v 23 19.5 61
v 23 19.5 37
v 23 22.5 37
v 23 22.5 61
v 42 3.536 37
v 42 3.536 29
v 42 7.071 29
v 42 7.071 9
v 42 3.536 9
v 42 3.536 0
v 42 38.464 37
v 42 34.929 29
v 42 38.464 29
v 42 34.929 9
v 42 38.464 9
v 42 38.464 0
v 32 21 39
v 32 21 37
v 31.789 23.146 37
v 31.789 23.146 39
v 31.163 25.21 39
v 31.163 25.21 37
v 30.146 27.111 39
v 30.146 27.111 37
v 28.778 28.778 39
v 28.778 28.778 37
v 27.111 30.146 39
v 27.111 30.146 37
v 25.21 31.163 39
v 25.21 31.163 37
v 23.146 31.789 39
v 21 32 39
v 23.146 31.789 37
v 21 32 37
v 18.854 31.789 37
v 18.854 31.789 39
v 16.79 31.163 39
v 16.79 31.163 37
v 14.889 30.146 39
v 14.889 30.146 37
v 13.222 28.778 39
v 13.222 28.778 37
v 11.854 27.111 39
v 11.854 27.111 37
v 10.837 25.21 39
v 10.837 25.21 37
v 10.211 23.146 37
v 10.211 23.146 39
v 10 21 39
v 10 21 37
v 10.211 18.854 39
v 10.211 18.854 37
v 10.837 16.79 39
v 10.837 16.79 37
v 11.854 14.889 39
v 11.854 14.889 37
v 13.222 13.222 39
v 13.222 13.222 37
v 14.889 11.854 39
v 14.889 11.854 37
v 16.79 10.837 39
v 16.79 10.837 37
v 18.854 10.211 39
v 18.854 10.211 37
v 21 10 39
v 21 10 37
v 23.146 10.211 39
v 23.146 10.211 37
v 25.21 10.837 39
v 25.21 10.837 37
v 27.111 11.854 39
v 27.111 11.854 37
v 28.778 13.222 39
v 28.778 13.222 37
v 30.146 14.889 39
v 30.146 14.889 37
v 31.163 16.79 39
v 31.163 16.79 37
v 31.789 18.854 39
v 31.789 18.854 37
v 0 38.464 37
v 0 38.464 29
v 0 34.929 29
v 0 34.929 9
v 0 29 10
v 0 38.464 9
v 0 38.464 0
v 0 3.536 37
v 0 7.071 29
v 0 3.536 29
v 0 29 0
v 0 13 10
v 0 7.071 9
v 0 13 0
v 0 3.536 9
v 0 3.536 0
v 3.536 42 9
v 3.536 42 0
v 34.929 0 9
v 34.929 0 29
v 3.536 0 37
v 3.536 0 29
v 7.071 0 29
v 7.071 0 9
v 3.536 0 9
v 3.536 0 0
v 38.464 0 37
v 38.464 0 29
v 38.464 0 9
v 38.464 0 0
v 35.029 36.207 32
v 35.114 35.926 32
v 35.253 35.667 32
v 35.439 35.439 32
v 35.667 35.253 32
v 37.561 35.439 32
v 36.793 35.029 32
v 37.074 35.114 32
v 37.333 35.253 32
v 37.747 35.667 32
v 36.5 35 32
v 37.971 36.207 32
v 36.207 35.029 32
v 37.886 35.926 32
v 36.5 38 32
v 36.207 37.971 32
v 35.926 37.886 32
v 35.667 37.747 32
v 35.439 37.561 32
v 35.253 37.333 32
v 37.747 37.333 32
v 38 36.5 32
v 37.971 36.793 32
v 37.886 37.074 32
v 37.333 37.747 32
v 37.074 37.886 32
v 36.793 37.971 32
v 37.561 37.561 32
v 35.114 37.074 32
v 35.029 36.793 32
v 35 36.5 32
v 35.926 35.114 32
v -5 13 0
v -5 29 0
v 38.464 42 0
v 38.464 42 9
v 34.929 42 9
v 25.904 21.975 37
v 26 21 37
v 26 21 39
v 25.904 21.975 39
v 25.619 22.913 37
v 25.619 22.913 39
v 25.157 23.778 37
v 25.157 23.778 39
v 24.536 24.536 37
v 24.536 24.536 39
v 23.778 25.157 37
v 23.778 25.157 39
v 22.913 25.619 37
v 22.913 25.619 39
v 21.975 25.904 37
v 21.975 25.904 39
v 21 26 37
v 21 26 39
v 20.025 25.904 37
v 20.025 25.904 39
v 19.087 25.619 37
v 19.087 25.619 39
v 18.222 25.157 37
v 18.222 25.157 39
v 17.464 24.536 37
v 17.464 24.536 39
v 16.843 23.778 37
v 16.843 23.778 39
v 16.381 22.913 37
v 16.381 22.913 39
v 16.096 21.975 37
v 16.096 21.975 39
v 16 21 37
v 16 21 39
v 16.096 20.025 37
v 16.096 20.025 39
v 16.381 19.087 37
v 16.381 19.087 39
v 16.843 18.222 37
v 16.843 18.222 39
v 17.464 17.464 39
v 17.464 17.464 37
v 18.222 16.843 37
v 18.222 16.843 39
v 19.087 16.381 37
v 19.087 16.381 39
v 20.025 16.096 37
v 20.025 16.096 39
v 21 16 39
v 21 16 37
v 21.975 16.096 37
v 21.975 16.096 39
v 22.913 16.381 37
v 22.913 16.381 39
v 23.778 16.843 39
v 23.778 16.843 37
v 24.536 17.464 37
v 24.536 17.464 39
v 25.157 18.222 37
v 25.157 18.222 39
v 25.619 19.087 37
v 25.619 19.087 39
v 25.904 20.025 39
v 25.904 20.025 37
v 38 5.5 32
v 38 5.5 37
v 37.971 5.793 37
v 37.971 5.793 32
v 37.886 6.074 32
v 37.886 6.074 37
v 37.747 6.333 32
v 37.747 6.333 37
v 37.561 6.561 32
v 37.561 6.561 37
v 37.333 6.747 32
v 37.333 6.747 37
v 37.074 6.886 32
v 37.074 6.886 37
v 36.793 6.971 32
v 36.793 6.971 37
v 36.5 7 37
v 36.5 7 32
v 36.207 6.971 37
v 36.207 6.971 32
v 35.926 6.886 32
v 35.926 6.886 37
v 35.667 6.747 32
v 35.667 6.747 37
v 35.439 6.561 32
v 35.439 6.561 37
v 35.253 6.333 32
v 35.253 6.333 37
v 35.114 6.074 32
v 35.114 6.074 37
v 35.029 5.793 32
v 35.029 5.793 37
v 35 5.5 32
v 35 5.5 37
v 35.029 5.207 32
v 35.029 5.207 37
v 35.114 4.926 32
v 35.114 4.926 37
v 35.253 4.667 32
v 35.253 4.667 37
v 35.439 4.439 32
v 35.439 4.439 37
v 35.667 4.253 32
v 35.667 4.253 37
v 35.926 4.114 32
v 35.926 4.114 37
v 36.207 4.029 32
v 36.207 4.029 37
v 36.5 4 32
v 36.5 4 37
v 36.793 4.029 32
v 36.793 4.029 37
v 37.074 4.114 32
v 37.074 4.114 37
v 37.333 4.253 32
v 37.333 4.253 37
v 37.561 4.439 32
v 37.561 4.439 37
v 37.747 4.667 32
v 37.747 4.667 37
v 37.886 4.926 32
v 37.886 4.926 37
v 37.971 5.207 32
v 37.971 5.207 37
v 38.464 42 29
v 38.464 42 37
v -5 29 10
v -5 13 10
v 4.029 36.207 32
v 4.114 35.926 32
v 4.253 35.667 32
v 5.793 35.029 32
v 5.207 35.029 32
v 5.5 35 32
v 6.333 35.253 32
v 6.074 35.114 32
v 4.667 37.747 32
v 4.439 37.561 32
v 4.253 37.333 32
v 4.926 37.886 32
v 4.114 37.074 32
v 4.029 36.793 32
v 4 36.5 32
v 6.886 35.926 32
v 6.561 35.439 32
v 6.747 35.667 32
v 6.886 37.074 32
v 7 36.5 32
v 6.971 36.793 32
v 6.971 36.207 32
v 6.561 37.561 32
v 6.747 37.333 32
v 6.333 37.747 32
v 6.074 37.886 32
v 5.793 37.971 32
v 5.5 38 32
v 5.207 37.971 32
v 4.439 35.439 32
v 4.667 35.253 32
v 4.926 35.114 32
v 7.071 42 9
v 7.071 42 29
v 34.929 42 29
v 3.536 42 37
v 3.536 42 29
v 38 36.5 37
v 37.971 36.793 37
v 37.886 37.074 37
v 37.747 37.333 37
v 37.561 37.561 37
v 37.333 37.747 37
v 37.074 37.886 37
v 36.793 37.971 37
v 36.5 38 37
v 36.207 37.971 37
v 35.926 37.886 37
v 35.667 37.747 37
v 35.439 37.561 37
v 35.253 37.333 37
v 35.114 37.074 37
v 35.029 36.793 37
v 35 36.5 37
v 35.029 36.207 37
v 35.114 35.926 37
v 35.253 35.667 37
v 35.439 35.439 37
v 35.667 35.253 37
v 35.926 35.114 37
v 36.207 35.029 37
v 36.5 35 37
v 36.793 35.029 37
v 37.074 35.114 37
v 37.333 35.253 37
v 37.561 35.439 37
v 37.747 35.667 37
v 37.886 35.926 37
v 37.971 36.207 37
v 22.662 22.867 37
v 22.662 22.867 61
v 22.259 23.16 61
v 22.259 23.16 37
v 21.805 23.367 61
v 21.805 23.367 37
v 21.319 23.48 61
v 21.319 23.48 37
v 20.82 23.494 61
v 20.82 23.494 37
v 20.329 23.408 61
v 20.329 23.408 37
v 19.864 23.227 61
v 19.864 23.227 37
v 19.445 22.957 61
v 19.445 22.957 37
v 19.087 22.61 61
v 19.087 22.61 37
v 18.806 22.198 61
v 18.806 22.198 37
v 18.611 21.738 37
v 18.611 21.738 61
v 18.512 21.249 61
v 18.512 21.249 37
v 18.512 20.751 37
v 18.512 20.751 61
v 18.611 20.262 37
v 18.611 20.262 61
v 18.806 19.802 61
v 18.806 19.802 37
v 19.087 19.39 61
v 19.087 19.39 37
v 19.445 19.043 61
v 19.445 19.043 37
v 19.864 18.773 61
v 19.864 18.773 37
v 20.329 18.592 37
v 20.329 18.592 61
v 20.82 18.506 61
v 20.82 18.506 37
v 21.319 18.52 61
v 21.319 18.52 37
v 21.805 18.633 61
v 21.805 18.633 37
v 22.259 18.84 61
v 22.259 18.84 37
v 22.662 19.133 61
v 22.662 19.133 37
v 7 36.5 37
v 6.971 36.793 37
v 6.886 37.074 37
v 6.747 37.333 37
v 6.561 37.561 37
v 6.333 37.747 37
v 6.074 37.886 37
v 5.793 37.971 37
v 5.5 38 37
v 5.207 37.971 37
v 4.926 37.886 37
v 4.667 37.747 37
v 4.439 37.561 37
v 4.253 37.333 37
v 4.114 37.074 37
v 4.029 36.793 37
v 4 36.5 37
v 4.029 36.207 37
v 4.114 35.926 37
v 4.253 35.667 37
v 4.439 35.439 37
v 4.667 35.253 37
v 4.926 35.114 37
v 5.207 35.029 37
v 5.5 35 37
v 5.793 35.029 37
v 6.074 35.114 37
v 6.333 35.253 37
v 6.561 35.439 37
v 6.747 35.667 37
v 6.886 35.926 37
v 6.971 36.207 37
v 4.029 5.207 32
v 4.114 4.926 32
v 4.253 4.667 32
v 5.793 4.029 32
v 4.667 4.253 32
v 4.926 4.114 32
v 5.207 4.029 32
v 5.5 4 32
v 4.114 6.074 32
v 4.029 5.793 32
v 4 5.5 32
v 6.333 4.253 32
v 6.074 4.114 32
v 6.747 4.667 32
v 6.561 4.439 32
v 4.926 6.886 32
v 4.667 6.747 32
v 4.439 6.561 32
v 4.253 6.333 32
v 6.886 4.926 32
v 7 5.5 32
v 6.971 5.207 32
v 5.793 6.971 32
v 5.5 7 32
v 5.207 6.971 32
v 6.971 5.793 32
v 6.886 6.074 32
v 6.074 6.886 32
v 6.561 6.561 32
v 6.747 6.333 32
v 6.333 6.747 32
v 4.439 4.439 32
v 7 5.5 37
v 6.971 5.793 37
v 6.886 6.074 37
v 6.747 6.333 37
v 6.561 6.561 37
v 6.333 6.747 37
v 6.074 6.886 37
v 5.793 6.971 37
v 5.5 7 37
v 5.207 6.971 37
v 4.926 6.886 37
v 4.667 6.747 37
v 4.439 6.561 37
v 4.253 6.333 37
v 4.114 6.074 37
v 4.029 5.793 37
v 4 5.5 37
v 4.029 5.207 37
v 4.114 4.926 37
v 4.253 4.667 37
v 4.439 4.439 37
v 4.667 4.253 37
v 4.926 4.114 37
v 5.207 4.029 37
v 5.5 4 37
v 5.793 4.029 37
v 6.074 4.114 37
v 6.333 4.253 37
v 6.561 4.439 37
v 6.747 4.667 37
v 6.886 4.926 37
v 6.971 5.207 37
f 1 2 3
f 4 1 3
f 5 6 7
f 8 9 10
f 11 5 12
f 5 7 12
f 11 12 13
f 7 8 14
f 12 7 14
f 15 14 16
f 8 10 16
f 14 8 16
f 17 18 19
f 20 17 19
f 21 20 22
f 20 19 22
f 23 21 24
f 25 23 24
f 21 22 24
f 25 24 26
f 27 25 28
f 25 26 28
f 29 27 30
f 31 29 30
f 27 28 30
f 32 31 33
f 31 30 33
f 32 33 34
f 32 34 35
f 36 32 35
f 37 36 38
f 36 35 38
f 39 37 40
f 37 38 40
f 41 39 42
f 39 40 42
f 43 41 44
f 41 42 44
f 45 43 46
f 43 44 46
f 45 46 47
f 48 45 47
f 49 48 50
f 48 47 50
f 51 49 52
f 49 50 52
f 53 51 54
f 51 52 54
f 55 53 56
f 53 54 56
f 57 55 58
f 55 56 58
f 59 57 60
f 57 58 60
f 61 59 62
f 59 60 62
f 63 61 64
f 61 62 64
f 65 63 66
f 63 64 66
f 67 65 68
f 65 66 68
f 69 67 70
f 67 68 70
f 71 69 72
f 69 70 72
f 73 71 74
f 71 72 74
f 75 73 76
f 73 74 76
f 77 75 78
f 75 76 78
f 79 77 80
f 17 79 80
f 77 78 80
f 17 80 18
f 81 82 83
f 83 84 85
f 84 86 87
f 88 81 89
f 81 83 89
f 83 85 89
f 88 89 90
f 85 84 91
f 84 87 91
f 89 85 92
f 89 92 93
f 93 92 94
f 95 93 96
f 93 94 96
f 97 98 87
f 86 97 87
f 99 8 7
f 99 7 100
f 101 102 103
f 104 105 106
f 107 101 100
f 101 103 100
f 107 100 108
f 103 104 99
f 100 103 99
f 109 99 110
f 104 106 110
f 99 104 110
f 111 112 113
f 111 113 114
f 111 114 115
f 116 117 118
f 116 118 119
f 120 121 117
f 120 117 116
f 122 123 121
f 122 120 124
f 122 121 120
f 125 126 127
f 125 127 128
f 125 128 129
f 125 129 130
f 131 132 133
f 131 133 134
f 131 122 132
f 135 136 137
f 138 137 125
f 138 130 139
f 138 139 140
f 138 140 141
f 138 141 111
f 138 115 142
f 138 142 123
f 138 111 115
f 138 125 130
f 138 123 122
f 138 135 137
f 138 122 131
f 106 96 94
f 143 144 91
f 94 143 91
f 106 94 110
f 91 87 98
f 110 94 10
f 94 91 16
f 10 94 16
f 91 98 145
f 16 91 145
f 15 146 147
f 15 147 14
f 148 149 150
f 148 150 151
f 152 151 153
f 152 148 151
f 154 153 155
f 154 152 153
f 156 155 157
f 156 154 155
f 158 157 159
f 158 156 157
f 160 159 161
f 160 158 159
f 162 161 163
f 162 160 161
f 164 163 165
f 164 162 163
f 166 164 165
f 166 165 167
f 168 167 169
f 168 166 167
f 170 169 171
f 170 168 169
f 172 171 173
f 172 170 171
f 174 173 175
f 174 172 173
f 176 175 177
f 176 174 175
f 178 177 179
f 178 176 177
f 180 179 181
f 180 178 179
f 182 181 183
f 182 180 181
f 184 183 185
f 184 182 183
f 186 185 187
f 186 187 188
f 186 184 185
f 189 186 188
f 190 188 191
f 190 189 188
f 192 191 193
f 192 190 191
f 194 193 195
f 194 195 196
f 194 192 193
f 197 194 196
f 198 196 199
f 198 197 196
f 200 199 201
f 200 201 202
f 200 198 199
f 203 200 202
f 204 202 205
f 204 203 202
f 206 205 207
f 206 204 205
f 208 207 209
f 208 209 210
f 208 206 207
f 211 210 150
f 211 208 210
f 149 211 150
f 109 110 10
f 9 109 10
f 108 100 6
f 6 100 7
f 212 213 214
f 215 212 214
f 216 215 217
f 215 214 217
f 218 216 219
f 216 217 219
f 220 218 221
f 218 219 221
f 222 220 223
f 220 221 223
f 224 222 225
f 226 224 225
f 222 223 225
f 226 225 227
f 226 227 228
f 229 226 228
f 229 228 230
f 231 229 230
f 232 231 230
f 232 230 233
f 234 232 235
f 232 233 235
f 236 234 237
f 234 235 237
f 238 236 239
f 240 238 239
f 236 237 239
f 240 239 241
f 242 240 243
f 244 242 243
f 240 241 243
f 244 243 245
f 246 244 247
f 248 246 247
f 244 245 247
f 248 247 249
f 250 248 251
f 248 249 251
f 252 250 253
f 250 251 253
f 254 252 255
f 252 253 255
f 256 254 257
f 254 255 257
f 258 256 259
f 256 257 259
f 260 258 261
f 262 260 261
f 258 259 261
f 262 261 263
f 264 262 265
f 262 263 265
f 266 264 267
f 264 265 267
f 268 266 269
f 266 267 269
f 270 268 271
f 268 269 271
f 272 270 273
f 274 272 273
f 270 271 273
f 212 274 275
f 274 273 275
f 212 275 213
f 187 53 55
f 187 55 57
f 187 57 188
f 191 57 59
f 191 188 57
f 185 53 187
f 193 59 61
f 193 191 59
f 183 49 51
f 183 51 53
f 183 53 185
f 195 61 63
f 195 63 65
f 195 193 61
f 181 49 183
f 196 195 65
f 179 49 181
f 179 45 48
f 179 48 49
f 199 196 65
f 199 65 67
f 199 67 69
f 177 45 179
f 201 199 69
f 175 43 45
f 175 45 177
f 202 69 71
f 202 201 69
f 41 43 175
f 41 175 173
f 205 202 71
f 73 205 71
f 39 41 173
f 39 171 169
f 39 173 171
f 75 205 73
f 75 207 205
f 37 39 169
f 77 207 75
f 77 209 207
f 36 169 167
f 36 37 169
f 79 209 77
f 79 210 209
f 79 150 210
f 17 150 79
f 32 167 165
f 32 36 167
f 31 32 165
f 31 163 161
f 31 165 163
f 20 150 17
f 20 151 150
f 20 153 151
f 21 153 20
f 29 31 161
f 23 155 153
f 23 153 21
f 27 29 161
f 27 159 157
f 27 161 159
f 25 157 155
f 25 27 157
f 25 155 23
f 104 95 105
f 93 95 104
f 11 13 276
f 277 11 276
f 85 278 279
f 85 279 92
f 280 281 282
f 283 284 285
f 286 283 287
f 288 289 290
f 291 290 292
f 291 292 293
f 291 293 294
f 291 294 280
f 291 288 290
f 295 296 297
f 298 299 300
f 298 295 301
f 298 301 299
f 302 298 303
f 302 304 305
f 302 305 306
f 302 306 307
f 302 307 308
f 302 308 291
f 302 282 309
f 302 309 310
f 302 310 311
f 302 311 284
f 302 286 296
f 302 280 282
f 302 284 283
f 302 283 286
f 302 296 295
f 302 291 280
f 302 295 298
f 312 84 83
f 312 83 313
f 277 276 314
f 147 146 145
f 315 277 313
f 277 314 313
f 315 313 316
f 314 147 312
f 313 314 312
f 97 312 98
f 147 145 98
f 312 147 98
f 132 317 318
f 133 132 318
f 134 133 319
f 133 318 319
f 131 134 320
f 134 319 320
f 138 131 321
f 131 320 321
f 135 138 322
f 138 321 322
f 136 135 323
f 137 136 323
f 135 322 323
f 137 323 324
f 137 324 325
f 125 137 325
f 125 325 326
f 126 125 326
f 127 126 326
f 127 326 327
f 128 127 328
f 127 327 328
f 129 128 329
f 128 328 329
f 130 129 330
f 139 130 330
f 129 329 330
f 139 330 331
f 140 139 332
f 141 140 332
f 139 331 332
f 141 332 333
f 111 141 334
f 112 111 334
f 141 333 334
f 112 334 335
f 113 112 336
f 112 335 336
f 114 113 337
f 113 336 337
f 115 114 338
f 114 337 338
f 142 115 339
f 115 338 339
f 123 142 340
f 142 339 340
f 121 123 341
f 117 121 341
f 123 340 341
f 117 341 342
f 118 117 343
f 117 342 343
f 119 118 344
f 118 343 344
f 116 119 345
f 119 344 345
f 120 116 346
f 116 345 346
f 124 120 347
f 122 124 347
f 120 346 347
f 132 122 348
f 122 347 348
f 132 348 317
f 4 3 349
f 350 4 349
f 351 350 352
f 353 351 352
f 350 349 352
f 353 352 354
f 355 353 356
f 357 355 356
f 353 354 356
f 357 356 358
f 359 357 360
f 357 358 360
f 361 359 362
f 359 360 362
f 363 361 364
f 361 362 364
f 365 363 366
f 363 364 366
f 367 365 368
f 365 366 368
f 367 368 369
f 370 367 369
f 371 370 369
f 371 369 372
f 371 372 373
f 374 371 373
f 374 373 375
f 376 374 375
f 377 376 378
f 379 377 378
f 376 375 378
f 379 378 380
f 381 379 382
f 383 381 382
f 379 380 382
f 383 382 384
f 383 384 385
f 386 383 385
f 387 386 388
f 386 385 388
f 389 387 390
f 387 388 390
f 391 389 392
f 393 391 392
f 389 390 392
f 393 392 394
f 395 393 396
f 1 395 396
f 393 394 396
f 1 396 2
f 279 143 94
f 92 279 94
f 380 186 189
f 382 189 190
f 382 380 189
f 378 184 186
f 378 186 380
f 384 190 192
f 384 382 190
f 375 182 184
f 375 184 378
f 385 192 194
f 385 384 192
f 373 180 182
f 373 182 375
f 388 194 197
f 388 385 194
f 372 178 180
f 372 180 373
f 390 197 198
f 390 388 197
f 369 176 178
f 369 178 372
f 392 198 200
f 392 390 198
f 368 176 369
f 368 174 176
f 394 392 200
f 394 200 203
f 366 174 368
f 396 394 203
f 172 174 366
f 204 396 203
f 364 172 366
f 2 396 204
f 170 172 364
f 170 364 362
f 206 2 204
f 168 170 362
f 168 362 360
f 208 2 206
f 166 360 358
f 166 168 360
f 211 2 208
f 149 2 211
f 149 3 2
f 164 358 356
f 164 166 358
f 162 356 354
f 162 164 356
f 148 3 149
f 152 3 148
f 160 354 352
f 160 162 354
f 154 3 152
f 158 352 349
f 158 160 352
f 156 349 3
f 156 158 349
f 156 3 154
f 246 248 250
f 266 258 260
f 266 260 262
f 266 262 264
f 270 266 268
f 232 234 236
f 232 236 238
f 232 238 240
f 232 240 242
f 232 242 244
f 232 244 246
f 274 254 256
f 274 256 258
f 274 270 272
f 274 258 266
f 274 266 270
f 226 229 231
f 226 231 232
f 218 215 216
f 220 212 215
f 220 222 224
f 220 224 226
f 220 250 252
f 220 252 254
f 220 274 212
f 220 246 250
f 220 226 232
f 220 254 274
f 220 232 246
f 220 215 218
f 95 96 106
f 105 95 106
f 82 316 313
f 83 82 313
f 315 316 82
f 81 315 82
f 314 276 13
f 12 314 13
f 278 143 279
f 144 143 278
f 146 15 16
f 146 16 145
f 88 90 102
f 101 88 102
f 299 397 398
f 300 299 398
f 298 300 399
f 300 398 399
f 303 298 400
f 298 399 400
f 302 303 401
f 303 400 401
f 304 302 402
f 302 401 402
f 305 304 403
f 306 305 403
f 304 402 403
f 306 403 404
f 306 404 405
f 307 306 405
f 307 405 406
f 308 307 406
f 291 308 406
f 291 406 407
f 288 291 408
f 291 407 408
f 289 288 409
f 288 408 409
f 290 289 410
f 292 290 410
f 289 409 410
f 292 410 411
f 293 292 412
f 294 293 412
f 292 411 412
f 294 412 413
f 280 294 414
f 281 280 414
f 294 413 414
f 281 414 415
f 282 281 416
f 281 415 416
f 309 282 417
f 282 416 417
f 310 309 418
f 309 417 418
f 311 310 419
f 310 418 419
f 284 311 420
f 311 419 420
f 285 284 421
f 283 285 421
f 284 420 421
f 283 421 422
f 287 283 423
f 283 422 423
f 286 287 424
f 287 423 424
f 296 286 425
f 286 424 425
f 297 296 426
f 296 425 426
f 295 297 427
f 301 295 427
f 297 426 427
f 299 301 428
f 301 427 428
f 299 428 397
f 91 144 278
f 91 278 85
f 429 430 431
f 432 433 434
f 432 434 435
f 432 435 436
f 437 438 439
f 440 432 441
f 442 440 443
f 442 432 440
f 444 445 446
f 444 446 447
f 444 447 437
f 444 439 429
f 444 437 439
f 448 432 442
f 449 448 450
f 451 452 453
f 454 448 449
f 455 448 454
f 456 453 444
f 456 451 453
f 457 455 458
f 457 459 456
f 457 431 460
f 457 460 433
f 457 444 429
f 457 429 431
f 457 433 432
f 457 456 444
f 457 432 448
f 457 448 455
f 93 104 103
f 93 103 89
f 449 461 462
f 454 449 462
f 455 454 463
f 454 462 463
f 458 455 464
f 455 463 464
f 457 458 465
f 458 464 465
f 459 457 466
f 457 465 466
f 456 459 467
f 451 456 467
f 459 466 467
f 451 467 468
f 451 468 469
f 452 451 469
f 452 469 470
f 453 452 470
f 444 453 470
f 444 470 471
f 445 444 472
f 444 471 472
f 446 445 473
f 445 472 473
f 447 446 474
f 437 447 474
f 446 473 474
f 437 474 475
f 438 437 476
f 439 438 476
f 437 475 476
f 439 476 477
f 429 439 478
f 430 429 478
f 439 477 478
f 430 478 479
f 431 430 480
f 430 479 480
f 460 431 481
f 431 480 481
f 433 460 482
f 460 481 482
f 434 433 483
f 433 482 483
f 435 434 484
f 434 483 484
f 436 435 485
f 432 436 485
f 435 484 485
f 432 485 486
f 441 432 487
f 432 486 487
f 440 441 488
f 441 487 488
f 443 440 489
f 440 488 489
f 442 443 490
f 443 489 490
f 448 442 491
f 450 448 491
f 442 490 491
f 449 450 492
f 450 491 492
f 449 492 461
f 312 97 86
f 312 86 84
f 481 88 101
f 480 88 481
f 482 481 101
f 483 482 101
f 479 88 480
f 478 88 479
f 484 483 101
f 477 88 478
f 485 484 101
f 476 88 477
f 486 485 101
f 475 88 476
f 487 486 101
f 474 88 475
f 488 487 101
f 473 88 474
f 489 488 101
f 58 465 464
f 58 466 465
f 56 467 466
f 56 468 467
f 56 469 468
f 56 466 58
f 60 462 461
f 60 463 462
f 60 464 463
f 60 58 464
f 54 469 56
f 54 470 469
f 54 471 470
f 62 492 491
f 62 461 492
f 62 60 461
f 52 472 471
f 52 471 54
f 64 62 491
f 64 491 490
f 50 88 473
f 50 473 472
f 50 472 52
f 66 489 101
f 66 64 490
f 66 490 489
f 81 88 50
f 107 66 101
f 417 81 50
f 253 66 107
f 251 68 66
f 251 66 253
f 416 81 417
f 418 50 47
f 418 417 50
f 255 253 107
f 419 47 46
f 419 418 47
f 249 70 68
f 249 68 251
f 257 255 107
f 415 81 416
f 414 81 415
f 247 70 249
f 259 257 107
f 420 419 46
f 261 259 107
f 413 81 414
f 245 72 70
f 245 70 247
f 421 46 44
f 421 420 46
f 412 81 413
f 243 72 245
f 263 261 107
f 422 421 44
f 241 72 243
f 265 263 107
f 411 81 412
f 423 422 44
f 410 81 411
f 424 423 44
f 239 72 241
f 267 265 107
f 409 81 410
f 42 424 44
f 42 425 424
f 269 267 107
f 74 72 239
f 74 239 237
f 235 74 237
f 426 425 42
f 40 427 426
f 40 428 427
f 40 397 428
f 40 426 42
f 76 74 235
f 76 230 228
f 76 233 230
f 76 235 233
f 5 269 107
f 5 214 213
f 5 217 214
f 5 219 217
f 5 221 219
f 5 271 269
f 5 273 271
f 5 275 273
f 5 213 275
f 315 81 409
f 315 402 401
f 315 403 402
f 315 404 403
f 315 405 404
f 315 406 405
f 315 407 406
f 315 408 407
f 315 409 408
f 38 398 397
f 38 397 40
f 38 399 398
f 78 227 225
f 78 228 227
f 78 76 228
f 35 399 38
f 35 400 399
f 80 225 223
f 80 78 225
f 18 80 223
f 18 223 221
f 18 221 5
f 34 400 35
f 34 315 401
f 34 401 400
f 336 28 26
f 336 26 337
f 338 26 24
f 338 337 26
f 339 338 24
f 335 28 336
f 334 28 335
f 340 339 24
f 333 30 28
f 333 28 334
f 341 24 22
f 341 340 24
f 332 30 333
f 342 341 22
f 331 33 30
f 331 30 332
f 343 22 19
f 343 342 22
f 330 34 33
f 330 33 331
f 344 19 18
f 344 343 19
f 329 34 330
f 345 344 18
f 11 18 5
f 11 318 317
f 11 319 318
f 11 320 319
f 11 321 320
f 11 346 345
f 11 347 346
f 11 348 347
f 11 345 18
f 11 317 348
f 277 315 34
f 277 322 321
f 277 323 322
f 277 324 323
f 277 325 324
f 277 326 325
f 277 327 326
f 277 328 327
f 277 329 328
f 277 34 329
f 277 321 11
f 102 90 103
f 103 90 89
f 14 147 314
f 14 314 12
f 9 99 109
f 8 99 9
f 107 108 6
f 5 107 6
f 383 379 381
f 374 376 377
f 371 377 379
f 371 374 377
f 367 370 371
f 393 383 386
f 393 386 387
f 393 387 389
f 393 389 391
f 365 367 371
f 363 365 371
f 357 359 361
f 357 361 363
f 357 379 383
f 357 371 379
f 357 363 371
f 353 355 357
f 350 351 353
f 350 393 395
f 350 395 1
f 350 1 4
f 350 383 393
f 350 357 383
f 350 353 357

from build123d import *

# Parameters (mm, degrees)
PAD_DEPTH       = 37
SKETCH001_W     = 92
SKETCH001_H     = 92
POCKET_DEPTH    = 20
SKETCH002_R     = 11
SKETCH002_R_2   = 5
PAD001_DEPTH    = 2
SKETCH003_R     = 1.5
POCKET001_DEPTH = 5
PAD002_DEPTH    = 24
SKETCH005_W     = 5
SKETCH005_H     = 16
PAD003_DEPTH    = 10


with BuildPart() as part:
    # Sketch → Pad (new body)
    with BuildSketch(Plane.XY):
        Polygon((0, 3.535534), (3.535534, 0), (38.464466, 0), (42, 3.535534), (42, 38.464466), (38.464466, 42), (3.535534, 42), (0, 38.464466), align=None)
    extrude(amount=PAD_DEPTH)

    # Sketch001 (on DatumPlane) → Pocket (cut)
    with BuildSketch(Plane.XY.offset(9)):
        with Locations((21, 21)):
            Rectangle(SKETCH001_W, SKETCH001_H)
        Polygon((34.928932, 42), (42, 34.928932), (42, 7.071068), (34.928932, 0), (7.071068, 0), (0, 7.071068), (0, 34.928932), (7.071068, 42), align=None, mode=Mode.SUBTRACT)
    extrude(amount=POCKET_DEPTH, mode=Mode.SUBTRACT)

    # Sketch002 (on DatumPlane) → Pad001 (join)
    with BuildSketch(Plane.XY.offset(37)):
        with Locations((21, 21)):
            Circle(SKETCH002_R)
        with Locations((21, 21)):
            Circle(SKETCH002_R_2, mode=Mode.SUBTRACT)
    extrude(amount=PAD001_DEPTH)

    # Sketch003 (on DatumPlane) → Pocket001 (cut)
    with BuildSketch(Plane.XY.offset(37)):
        with Locations((5.5, 36.5)):
            Circle(SKETCH003_R)
        with Locations((36.5, 36.5)):
            Circle(SKETCH003_R)
        with Locations((36.5, 5.5)):
            Circle(SKETCH003_R)
        with Locations((5.5, 5.5)):
            Circle(SKETCH003_R)
    extrude(amount=-POCKET001_DEPTH, mode=Mode.SUBTRACT)

    # Sketch004 (on DatumPlane) → Pad002 (join)
    with BuildSketch(Plane.XY.offset(37)):
        with BuildLine():
            ThreePointArc((23, 22.5), (18.5, 21), (23, 19.5))
            Line((23, 19.5), (23, 22.5))
        make_face()
    extrude(amount=PAD002_DEPTH)

    # Sketch005 → Pad003 (join)
    with BuildSketch(Plane.XY):
        with Locations((-2.5, 21)):
            Rectangle(SKETCH005_W, SKETCH005_H)
    extrude(amount=PAD003_DEPTH)


solid = part.part
